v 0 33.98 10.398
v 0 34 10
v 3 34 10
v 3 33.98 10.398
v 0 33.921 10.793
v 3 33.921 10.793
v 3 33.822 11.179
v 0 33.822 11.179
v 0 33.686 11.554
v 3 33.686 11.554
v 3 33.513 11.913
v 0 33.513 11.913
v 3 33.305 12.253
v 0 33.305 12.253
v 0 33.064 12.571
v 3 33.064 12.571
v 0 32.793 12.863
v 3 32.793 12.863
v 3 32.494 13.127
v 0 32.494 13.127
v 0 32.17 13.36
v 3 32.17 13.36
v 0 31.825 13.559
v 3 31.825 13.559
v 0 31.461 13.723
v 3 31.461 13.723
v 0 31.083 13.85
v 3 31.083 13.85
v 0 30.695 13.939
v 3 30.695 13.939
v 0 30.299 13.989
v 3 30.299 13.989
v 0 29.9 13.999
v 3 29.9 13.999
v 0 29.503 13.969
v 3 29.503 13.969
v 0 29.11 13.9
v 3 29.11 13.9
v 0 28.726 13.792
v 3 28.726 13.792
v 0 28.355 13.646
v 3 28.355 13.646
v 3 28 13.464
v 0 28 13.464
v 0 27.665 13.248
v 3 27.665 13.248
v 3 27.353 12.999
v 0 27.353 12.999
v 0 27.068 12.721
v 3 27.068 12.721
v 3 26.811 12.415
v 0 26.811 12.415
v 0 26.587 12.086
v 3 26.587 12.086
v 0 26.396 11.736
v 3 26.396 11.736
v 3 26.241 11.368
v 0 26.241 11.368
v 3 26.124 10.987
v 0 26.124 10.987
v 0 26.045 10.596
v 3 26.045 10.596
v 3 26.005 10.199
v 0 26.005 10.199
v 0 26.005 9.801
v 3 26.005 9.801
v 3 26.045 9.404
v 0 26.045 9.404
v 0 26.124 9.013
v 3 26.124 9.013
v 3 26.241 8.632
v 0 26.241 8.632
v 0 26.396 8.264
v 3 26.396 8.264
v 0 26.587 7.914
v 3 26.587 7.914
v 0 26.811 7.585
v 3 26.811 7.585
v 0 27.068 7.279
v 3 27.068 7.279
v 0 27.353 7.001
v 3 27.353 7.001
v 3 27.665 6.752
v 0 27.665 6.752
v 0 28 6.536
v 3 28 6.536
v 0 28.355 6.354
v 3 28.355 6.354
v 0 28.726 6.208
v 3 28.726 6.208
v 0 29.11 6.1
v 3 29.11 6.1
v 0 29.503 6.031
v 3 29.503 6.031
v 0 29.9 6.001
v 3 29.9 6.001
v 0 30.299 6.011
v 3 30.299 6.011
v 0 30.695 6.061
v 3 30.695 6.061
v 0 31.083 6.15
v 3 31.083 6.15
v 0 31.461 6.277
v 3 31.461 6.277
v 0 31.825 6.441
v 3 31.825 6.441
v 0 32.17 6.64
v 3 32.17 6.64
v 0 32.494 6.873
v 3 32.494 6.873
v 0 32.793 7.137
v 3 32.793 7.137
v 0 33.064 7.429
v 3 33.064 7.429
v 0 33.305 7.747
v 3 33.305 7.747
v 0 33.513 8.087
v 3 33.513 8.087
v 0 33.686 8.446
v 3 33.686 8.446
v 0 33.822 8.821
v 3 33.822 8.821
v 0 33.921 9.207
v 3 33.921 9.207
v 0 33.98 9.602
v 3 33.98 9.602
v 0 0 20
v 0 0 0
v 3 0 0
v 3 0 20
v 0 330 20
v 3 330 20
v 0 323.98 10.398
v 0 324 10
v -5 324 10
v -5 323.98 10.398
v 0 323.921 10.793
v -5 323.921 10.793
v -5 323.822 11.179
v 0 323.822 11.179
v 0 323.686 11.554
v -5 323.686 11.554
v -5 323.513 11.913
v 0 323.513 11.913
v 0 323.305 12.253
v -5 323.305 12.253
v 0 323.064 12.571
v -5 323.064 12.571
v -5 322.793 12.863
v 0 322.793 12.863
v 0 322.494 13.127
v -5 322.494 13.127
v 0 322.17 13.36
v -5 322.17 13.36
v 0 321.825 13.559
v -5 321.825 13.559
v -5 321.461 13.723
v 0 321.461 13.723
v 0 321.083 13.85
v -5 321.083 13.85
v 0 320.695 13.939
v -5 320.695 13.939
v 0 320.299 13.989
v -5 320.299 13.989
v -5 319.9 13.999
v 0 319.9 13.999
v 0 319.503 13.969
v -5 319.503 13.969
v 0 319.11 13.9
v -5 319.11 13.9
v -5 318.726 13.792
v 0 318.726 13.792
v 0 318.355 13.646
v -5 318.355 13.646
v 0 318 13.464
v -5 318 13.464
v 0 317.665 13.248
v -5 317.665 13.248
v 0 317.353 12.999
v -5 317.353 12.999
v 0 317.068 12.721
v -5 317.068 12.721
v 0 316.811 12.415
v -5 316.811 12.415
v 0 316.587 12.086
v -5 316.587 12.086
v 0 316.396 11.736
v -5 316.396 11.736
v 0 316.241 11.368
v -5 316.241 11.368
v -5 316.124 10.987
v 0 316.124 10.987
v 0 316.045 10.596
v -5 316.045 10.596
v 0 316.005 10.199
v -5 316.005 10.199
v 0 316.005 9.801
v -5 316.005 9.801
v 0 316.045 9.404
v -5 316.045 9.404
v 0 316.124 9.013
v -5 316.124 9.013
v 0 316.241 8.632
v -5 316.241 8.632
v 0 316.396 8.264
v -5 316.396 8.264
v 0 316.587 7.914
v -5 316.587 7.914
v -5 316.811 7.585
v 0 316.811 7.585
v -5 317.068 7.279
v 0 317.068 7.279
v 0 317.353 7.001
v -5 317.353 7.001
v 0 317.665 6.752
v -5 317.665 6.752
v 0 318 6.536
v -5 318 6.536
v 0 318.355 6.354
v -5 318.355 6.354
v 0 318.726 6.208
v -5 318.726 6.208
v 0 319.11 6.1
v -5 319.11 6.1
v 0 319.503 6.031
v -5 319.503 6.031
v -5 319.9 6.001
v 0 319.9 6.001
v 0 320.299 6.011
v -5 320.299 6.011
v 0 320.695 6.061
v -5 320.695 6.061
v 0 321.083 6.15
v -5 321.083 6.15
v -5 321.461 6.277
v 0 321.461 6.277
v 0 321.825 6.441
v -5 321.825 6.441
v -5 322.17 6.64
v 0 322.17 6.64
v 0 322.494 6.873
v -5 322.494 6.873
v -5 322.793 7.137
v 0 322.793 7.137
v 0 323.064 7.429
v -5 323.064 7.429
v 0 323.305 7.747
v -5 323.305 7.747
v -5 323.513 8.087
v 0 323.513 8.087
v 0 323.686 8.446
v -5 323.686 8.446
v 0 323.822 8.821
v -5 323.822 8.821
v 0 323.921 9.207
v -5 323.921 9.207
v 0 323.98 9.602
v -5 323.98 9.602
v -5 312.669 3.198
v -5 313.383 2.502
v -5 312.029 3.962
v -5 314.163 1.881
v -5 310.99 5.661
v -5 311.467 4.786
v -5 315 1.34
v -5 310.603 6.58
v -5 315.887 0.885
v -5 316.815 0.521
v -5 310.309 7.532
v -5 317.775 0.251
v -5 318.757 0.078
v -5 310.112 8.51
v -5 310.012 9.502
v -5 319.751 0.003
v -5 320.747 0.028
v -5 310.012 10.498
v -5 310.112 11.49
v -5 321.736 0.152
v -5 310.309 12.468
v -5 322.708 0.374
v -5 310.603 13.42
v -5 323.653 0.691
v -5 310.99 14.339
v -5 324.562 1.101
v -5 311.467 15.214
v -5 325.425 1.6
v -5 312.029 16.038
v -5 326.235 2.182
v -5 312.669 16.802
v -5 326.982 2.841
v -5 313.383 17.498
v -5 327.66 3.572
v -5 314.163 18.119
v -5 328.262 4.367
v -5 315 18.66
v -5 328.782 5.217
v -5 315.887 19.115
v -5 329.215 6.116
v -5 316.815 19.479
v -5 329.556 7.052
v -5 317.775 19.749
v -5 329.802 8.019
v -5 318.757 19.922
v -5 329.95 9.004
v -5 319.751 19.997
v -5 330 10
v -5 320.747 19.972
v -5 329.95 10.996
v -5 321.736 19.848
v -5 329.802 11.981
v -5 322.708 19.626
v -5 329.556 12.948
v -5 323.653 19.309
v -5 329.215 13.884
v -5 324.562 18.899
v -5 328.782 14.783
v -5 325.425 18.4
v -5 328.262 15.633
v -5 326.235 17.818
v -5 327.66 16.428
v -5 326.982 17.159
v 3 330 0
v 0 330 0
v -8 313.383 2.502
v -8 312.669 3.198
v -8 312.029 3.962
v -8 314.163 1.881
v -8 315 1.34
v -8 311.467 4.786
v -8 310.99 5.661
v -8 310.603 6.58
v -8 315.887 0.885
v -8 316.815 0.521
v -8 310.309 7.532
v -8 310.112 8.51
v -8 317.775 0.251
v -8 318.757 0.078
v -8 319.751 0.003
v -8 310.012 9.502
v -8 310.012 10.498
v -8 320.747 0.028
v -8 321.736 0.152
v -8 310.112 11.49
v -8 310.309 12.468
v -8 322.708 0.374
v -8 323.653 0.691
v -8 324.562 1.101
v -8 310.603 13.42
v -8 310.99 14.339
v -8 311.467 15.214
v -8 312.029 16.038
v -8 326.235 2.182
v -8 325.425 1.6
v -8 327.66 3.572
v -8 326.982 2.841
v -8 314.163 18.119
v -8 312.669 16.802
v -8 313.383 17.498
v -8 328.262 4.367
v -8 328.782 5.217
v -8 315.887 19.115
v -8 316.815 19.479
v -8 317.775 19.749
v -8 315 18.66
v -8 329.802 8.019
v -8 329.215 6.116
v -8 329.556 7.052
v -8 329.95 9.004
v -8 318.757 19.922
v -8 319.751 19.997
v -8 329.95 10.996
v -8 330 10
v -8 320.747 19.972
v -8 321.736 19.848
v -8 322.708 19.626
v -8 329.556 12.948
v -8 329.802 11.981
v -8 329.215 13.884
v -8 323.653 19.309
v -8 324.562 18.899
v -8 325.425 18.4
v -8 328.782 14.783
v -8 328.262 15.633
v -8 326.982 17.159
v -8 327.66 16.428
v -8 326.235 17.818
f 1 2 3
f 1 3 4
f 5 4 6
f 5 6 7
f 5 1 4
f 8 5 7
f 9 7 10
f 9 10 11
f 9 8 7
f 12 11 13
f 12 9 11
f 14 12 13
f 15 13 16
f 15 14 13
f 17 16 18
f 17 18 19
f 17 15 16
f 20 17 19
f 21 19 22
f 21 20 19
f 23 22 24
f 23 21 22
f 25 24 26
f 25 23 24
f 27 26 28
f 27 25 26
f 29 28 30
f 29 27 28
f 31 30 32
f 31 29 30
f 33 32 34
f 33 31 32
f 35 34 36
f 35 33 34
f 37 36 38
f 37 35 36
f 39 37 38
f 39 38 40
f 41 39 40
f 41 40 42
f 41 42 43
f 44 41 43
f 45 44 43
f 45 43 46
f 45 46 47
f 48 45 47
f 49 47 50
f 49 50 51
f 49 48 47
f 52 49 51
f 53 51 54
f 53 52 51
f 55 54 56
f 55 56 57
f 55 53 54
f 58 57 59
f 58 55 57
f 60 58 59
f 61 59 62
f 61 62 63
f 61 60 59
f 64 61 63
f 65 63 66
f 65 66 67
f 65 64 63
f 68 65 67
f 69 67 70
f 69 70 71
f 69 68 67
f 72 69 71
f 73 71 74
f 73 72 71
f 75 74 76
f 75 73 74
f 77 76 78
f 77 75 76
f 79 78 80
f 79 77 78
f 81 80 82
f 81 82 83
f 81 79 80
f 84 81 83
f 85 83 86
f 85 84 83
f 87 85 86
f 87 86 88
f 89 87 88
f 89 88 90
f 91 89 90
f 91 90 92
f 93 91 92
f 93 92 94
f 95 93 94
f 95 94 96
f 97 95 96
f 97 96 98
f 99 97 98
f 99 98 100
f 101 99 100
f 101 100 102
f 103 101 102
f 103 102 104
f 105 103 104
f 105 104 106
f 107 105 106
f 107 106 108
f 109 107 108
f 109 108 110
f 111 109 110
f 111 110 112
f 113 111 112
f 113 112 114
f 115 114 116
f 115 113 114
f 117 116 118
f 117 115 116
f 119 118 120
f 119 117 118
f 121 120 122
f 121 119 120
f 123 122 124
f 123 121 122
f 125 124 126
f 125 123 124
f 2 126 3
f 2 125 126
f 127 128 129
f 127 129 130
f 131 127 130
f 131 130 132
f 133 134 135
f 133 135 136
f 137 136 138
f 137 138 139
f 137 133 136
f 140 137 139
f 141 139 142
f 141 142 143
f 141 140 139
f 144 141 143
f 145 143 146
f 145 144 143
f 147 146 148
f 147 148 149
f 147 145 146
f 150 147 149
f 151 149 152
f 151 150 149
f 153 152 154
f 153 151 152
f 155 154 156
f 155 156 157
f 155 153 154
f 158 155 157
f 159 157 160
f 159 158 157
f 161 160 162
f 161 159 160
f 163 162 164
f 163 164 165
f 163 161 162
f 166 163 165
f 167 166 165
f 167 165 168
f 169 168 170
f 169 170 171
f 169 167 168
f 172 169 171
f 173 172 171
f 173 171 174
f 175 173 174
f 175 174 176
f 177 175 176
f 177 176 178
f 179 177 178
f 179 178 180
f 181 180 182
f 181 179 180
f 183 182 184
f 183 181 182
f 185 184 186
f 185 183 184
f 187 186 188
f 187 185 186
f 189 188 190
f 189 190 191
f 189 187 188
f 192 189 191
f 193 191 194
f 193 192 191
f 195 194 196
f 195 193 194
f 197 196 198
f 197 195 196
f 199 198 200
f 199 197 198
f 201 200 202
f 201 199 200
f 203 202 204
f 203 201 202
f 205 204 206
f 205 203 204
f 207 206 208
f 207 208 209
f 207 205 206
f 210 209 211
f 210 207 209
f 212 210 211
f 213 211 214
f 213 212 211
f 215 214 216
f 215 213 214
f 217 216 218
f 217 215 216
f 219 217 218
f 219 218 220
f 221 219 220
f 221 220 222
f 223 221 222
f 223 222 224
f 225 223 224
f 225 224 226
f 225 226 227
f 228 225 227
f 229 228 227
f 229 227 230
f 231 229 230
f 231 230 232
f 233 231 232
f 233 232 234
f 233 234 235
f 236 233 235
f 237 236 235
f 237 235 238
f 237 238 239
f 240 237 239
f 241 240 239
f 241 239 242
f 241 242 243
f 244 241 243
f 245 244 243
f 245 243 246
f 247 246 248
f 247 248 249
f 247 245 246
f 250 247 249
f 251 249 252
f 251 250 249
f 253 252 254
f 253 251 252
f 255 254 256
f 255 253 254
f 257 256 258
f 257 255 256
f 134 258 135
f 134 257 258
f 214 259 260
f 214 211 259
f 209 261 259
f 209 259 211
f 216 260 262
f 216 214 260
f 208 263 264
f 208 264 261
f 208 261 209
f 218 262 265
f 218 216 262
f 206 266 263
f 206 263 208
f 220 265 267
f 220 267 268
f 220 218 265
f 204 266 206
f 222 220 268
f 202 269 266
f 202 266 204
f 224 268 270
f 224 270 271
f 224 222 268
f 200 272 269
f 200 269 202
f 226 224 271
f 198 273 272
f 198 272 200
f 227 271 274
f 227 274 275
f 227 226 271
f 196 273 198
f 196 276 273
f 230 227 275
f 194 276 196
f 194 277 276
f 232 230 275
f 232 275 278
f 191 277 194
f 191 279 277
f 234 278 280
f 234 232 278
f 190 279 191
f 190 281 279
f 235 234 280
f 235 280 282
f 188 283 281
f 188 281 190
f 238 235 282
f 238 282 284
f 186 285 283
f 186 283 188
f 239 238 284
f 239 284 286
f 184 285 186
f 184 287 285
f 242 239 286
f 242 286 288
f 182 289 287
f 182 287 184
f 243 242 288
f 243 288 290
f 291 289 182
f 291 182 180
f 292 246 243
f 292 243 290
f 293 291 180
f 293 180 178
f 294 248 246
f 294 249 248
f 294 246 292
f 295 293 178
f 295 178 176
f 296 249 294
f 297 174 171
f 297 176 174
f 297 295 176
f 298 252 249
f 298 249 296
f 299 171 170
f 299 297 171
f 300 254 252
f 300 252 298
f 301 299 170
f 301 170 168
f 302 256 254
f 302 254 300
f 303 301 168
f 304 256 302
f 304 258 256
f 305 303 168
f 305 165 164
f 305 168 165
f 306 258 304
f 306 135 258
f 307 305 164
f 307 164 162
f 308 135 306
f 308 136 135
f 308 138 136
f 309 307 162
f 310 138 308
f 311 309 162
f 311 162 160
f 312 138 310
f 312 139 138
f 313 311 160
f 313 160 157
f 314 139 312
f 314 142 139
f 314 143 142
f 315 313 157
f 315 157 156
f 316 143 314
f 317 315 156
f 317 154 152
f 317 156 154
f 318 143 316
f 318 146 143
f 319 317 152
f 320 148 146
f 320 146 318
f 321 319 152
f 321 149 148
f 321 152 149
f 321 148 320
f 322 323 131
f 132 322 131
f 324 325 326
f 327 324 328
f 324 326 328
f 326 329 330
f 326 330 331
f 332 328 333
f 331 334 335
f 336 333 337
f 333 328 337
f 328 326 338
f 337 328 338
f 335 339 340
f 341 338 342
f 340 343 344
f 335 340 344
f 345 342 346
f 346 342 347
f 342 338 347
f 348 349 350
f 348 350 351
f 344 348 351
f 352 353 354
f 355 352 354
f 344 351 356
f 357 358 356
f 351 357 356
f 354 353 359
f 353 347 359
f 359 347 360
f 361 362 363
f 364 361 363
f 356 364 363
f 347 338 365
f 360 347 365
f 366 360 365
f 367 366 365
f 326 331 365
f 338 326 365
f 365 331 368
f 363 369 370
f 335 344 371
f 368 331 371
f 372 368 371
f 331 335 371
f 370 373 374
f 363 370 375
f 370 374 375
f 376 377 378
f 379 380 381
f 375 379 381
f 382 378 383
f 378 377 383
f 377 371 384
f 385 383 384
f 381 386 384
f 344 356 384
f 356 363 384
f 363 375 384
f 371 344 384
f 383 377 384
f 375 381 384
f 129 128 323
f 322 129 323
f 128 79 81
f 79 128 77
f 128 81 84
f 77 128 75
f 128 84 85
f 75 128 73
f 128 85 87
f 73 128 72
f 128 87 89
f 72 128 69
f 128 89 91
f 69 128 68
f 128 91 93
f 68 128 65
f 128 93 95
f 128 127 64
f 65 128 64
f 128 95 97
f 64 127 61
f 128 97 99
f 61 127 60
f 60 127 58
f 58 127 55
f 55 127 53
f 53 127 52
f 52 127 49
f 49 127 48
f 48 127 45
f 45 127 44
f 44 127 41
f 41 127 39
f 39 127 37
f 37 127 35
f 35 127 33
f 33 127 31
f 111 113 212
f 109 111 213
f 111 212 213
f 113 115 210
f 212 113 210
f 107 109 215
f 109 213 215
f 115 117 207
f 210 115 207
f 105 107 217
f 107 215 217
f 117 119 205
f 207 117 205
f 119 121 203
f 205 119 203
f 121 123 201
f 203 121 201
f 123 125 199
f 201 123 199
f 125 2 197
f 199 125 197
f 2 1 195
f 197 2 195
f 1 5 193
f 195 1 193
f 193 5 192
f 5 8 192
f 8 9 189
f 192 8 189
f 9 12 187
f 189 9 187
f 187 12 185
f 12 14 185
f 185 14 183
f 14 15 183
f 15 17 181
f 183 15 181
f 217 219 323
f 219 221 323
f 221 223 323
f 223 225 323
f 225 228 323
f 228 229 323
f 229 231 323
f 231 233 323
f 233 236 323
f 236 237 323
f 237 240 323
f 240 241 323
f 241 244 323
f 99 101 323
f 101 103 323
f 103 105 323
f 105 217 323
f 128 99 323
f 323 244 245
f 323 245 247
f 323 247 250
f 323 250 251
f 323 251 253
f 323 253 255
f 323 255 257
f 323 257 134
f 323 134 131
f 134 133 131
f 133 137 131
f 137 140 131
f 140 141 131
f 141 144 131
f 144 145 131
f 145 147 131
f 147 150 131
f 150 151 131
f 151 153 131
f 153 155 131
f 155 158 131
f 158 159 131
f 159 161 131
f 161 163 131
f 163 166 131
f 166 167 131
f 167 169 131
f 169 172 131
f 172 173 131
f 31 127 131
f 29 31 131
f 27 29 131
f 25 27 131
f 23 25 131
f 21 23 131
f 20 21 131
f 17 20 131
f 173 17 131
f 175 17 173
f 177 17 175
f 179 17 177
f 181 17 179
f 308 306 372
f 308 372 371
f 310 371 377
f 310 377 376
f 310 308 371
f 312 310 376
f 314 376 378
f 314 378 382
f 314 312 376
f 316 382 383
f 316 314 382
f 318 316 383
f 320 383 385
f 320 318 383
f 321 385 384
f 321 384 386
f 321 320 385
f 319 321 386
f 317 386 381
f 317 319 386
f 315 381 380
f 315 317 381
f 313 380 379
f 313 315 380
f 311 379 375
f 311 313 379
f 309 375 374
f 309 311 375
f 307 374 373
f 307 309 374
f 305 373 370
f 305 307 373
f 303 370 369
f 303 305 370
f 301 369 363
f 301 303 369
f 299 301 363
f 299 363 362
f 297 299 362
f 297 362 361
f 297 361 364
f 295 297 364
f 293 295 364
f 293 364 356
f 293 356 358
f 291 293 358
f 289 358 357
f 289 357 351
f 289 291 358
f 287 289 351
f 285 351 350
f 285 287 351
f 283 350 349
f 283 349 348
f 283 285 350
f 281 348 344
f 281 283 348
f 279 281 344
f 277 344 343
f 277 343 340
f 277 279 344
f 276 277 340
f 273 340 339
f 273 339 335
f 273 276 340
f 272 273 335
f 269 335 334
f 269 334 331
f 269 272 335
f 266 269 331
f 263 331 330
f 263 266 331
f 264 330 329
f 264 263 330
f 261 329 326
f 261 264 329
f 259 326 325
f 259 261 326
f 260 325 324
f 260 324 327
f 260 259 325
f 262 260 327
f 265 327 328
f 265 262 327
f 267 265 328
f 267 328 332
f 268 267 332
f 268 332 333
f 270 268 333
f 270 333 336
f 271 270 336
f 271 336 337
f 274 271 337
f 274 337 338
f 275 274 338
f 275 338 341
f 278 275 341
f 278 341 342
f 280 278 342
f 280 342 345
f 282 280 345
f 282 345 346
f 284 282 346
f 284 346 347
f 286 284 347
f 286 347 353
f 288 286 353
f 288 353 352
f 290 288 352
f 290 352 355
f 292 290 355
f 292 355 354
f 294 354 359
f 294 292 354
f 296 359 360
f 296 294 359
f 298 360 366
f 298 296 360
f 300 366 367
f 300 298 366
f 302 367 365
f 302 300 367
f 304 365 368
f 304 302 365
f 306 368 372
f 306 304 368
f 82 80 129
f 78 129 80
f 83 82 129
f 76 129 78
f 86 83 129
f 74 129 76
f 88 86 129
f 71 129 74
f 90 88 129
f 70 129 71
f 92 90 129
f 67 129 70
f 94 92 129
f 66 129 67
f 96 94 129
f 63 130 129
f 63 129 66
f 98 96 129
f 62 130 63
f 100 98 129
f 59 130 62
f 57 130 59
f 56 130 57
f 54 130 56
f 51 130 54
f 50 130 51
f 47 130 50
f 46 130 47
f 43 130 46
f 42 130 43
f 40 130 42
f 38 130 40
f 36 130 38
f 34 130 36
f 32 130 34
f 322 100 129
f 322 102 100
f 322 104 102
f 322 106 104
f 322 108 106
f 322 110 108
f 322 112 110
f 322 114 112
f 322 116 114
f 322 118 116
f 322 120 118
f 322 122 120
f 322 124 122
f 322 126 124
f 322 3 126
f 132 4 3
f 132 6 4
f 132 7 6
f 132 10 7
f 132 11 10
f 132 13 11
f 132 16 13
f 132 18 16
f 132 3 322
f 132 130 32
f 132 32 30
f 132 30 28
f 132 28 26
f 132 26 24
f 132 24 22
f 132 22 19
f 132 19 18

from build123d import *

# Parameters (mm, degrees)
F0_W     = 330
F0_H     = 20
F0_R     = 4
F1_DEPTH = 3
F2_DEPTH = 5
F4_R     = 10
F5_DEPTH = 3


with BuildPart() as f1:
    # F0 (on Right) → F1 (new body)
    with BuildSketch(Plane.YZ):
        with Locations((165, 10)):
            Rectangle(F0_W, F0_H)
        with Locations((30, 10)):
            Circle(F0_R, mode=Mode.SUBTRACT)
        with Locations((320, 10)):
            Circle(F0_R, mode=Mode.SUBTRACT)
        with Locations((320, 10)):
            Circle(F0_R)
    extrude(amount=F1_DEPTH)

    # F0 (on Right) → F2 (join)
    with BuildSketch(Plane.YZ):
        with Locations((320, 10)):
            Circle(F0_R)
    extrude(amount=-F2_DEPTH)

    # F4 (on offset) → F5 (join)
    with BuildSketch(Plane.YZ.offset(-5)):
        with Locations((320, 10)):
            Circle(F4_R)
    extrude(amount=-F5_DEPTH)


solid = f1.part
